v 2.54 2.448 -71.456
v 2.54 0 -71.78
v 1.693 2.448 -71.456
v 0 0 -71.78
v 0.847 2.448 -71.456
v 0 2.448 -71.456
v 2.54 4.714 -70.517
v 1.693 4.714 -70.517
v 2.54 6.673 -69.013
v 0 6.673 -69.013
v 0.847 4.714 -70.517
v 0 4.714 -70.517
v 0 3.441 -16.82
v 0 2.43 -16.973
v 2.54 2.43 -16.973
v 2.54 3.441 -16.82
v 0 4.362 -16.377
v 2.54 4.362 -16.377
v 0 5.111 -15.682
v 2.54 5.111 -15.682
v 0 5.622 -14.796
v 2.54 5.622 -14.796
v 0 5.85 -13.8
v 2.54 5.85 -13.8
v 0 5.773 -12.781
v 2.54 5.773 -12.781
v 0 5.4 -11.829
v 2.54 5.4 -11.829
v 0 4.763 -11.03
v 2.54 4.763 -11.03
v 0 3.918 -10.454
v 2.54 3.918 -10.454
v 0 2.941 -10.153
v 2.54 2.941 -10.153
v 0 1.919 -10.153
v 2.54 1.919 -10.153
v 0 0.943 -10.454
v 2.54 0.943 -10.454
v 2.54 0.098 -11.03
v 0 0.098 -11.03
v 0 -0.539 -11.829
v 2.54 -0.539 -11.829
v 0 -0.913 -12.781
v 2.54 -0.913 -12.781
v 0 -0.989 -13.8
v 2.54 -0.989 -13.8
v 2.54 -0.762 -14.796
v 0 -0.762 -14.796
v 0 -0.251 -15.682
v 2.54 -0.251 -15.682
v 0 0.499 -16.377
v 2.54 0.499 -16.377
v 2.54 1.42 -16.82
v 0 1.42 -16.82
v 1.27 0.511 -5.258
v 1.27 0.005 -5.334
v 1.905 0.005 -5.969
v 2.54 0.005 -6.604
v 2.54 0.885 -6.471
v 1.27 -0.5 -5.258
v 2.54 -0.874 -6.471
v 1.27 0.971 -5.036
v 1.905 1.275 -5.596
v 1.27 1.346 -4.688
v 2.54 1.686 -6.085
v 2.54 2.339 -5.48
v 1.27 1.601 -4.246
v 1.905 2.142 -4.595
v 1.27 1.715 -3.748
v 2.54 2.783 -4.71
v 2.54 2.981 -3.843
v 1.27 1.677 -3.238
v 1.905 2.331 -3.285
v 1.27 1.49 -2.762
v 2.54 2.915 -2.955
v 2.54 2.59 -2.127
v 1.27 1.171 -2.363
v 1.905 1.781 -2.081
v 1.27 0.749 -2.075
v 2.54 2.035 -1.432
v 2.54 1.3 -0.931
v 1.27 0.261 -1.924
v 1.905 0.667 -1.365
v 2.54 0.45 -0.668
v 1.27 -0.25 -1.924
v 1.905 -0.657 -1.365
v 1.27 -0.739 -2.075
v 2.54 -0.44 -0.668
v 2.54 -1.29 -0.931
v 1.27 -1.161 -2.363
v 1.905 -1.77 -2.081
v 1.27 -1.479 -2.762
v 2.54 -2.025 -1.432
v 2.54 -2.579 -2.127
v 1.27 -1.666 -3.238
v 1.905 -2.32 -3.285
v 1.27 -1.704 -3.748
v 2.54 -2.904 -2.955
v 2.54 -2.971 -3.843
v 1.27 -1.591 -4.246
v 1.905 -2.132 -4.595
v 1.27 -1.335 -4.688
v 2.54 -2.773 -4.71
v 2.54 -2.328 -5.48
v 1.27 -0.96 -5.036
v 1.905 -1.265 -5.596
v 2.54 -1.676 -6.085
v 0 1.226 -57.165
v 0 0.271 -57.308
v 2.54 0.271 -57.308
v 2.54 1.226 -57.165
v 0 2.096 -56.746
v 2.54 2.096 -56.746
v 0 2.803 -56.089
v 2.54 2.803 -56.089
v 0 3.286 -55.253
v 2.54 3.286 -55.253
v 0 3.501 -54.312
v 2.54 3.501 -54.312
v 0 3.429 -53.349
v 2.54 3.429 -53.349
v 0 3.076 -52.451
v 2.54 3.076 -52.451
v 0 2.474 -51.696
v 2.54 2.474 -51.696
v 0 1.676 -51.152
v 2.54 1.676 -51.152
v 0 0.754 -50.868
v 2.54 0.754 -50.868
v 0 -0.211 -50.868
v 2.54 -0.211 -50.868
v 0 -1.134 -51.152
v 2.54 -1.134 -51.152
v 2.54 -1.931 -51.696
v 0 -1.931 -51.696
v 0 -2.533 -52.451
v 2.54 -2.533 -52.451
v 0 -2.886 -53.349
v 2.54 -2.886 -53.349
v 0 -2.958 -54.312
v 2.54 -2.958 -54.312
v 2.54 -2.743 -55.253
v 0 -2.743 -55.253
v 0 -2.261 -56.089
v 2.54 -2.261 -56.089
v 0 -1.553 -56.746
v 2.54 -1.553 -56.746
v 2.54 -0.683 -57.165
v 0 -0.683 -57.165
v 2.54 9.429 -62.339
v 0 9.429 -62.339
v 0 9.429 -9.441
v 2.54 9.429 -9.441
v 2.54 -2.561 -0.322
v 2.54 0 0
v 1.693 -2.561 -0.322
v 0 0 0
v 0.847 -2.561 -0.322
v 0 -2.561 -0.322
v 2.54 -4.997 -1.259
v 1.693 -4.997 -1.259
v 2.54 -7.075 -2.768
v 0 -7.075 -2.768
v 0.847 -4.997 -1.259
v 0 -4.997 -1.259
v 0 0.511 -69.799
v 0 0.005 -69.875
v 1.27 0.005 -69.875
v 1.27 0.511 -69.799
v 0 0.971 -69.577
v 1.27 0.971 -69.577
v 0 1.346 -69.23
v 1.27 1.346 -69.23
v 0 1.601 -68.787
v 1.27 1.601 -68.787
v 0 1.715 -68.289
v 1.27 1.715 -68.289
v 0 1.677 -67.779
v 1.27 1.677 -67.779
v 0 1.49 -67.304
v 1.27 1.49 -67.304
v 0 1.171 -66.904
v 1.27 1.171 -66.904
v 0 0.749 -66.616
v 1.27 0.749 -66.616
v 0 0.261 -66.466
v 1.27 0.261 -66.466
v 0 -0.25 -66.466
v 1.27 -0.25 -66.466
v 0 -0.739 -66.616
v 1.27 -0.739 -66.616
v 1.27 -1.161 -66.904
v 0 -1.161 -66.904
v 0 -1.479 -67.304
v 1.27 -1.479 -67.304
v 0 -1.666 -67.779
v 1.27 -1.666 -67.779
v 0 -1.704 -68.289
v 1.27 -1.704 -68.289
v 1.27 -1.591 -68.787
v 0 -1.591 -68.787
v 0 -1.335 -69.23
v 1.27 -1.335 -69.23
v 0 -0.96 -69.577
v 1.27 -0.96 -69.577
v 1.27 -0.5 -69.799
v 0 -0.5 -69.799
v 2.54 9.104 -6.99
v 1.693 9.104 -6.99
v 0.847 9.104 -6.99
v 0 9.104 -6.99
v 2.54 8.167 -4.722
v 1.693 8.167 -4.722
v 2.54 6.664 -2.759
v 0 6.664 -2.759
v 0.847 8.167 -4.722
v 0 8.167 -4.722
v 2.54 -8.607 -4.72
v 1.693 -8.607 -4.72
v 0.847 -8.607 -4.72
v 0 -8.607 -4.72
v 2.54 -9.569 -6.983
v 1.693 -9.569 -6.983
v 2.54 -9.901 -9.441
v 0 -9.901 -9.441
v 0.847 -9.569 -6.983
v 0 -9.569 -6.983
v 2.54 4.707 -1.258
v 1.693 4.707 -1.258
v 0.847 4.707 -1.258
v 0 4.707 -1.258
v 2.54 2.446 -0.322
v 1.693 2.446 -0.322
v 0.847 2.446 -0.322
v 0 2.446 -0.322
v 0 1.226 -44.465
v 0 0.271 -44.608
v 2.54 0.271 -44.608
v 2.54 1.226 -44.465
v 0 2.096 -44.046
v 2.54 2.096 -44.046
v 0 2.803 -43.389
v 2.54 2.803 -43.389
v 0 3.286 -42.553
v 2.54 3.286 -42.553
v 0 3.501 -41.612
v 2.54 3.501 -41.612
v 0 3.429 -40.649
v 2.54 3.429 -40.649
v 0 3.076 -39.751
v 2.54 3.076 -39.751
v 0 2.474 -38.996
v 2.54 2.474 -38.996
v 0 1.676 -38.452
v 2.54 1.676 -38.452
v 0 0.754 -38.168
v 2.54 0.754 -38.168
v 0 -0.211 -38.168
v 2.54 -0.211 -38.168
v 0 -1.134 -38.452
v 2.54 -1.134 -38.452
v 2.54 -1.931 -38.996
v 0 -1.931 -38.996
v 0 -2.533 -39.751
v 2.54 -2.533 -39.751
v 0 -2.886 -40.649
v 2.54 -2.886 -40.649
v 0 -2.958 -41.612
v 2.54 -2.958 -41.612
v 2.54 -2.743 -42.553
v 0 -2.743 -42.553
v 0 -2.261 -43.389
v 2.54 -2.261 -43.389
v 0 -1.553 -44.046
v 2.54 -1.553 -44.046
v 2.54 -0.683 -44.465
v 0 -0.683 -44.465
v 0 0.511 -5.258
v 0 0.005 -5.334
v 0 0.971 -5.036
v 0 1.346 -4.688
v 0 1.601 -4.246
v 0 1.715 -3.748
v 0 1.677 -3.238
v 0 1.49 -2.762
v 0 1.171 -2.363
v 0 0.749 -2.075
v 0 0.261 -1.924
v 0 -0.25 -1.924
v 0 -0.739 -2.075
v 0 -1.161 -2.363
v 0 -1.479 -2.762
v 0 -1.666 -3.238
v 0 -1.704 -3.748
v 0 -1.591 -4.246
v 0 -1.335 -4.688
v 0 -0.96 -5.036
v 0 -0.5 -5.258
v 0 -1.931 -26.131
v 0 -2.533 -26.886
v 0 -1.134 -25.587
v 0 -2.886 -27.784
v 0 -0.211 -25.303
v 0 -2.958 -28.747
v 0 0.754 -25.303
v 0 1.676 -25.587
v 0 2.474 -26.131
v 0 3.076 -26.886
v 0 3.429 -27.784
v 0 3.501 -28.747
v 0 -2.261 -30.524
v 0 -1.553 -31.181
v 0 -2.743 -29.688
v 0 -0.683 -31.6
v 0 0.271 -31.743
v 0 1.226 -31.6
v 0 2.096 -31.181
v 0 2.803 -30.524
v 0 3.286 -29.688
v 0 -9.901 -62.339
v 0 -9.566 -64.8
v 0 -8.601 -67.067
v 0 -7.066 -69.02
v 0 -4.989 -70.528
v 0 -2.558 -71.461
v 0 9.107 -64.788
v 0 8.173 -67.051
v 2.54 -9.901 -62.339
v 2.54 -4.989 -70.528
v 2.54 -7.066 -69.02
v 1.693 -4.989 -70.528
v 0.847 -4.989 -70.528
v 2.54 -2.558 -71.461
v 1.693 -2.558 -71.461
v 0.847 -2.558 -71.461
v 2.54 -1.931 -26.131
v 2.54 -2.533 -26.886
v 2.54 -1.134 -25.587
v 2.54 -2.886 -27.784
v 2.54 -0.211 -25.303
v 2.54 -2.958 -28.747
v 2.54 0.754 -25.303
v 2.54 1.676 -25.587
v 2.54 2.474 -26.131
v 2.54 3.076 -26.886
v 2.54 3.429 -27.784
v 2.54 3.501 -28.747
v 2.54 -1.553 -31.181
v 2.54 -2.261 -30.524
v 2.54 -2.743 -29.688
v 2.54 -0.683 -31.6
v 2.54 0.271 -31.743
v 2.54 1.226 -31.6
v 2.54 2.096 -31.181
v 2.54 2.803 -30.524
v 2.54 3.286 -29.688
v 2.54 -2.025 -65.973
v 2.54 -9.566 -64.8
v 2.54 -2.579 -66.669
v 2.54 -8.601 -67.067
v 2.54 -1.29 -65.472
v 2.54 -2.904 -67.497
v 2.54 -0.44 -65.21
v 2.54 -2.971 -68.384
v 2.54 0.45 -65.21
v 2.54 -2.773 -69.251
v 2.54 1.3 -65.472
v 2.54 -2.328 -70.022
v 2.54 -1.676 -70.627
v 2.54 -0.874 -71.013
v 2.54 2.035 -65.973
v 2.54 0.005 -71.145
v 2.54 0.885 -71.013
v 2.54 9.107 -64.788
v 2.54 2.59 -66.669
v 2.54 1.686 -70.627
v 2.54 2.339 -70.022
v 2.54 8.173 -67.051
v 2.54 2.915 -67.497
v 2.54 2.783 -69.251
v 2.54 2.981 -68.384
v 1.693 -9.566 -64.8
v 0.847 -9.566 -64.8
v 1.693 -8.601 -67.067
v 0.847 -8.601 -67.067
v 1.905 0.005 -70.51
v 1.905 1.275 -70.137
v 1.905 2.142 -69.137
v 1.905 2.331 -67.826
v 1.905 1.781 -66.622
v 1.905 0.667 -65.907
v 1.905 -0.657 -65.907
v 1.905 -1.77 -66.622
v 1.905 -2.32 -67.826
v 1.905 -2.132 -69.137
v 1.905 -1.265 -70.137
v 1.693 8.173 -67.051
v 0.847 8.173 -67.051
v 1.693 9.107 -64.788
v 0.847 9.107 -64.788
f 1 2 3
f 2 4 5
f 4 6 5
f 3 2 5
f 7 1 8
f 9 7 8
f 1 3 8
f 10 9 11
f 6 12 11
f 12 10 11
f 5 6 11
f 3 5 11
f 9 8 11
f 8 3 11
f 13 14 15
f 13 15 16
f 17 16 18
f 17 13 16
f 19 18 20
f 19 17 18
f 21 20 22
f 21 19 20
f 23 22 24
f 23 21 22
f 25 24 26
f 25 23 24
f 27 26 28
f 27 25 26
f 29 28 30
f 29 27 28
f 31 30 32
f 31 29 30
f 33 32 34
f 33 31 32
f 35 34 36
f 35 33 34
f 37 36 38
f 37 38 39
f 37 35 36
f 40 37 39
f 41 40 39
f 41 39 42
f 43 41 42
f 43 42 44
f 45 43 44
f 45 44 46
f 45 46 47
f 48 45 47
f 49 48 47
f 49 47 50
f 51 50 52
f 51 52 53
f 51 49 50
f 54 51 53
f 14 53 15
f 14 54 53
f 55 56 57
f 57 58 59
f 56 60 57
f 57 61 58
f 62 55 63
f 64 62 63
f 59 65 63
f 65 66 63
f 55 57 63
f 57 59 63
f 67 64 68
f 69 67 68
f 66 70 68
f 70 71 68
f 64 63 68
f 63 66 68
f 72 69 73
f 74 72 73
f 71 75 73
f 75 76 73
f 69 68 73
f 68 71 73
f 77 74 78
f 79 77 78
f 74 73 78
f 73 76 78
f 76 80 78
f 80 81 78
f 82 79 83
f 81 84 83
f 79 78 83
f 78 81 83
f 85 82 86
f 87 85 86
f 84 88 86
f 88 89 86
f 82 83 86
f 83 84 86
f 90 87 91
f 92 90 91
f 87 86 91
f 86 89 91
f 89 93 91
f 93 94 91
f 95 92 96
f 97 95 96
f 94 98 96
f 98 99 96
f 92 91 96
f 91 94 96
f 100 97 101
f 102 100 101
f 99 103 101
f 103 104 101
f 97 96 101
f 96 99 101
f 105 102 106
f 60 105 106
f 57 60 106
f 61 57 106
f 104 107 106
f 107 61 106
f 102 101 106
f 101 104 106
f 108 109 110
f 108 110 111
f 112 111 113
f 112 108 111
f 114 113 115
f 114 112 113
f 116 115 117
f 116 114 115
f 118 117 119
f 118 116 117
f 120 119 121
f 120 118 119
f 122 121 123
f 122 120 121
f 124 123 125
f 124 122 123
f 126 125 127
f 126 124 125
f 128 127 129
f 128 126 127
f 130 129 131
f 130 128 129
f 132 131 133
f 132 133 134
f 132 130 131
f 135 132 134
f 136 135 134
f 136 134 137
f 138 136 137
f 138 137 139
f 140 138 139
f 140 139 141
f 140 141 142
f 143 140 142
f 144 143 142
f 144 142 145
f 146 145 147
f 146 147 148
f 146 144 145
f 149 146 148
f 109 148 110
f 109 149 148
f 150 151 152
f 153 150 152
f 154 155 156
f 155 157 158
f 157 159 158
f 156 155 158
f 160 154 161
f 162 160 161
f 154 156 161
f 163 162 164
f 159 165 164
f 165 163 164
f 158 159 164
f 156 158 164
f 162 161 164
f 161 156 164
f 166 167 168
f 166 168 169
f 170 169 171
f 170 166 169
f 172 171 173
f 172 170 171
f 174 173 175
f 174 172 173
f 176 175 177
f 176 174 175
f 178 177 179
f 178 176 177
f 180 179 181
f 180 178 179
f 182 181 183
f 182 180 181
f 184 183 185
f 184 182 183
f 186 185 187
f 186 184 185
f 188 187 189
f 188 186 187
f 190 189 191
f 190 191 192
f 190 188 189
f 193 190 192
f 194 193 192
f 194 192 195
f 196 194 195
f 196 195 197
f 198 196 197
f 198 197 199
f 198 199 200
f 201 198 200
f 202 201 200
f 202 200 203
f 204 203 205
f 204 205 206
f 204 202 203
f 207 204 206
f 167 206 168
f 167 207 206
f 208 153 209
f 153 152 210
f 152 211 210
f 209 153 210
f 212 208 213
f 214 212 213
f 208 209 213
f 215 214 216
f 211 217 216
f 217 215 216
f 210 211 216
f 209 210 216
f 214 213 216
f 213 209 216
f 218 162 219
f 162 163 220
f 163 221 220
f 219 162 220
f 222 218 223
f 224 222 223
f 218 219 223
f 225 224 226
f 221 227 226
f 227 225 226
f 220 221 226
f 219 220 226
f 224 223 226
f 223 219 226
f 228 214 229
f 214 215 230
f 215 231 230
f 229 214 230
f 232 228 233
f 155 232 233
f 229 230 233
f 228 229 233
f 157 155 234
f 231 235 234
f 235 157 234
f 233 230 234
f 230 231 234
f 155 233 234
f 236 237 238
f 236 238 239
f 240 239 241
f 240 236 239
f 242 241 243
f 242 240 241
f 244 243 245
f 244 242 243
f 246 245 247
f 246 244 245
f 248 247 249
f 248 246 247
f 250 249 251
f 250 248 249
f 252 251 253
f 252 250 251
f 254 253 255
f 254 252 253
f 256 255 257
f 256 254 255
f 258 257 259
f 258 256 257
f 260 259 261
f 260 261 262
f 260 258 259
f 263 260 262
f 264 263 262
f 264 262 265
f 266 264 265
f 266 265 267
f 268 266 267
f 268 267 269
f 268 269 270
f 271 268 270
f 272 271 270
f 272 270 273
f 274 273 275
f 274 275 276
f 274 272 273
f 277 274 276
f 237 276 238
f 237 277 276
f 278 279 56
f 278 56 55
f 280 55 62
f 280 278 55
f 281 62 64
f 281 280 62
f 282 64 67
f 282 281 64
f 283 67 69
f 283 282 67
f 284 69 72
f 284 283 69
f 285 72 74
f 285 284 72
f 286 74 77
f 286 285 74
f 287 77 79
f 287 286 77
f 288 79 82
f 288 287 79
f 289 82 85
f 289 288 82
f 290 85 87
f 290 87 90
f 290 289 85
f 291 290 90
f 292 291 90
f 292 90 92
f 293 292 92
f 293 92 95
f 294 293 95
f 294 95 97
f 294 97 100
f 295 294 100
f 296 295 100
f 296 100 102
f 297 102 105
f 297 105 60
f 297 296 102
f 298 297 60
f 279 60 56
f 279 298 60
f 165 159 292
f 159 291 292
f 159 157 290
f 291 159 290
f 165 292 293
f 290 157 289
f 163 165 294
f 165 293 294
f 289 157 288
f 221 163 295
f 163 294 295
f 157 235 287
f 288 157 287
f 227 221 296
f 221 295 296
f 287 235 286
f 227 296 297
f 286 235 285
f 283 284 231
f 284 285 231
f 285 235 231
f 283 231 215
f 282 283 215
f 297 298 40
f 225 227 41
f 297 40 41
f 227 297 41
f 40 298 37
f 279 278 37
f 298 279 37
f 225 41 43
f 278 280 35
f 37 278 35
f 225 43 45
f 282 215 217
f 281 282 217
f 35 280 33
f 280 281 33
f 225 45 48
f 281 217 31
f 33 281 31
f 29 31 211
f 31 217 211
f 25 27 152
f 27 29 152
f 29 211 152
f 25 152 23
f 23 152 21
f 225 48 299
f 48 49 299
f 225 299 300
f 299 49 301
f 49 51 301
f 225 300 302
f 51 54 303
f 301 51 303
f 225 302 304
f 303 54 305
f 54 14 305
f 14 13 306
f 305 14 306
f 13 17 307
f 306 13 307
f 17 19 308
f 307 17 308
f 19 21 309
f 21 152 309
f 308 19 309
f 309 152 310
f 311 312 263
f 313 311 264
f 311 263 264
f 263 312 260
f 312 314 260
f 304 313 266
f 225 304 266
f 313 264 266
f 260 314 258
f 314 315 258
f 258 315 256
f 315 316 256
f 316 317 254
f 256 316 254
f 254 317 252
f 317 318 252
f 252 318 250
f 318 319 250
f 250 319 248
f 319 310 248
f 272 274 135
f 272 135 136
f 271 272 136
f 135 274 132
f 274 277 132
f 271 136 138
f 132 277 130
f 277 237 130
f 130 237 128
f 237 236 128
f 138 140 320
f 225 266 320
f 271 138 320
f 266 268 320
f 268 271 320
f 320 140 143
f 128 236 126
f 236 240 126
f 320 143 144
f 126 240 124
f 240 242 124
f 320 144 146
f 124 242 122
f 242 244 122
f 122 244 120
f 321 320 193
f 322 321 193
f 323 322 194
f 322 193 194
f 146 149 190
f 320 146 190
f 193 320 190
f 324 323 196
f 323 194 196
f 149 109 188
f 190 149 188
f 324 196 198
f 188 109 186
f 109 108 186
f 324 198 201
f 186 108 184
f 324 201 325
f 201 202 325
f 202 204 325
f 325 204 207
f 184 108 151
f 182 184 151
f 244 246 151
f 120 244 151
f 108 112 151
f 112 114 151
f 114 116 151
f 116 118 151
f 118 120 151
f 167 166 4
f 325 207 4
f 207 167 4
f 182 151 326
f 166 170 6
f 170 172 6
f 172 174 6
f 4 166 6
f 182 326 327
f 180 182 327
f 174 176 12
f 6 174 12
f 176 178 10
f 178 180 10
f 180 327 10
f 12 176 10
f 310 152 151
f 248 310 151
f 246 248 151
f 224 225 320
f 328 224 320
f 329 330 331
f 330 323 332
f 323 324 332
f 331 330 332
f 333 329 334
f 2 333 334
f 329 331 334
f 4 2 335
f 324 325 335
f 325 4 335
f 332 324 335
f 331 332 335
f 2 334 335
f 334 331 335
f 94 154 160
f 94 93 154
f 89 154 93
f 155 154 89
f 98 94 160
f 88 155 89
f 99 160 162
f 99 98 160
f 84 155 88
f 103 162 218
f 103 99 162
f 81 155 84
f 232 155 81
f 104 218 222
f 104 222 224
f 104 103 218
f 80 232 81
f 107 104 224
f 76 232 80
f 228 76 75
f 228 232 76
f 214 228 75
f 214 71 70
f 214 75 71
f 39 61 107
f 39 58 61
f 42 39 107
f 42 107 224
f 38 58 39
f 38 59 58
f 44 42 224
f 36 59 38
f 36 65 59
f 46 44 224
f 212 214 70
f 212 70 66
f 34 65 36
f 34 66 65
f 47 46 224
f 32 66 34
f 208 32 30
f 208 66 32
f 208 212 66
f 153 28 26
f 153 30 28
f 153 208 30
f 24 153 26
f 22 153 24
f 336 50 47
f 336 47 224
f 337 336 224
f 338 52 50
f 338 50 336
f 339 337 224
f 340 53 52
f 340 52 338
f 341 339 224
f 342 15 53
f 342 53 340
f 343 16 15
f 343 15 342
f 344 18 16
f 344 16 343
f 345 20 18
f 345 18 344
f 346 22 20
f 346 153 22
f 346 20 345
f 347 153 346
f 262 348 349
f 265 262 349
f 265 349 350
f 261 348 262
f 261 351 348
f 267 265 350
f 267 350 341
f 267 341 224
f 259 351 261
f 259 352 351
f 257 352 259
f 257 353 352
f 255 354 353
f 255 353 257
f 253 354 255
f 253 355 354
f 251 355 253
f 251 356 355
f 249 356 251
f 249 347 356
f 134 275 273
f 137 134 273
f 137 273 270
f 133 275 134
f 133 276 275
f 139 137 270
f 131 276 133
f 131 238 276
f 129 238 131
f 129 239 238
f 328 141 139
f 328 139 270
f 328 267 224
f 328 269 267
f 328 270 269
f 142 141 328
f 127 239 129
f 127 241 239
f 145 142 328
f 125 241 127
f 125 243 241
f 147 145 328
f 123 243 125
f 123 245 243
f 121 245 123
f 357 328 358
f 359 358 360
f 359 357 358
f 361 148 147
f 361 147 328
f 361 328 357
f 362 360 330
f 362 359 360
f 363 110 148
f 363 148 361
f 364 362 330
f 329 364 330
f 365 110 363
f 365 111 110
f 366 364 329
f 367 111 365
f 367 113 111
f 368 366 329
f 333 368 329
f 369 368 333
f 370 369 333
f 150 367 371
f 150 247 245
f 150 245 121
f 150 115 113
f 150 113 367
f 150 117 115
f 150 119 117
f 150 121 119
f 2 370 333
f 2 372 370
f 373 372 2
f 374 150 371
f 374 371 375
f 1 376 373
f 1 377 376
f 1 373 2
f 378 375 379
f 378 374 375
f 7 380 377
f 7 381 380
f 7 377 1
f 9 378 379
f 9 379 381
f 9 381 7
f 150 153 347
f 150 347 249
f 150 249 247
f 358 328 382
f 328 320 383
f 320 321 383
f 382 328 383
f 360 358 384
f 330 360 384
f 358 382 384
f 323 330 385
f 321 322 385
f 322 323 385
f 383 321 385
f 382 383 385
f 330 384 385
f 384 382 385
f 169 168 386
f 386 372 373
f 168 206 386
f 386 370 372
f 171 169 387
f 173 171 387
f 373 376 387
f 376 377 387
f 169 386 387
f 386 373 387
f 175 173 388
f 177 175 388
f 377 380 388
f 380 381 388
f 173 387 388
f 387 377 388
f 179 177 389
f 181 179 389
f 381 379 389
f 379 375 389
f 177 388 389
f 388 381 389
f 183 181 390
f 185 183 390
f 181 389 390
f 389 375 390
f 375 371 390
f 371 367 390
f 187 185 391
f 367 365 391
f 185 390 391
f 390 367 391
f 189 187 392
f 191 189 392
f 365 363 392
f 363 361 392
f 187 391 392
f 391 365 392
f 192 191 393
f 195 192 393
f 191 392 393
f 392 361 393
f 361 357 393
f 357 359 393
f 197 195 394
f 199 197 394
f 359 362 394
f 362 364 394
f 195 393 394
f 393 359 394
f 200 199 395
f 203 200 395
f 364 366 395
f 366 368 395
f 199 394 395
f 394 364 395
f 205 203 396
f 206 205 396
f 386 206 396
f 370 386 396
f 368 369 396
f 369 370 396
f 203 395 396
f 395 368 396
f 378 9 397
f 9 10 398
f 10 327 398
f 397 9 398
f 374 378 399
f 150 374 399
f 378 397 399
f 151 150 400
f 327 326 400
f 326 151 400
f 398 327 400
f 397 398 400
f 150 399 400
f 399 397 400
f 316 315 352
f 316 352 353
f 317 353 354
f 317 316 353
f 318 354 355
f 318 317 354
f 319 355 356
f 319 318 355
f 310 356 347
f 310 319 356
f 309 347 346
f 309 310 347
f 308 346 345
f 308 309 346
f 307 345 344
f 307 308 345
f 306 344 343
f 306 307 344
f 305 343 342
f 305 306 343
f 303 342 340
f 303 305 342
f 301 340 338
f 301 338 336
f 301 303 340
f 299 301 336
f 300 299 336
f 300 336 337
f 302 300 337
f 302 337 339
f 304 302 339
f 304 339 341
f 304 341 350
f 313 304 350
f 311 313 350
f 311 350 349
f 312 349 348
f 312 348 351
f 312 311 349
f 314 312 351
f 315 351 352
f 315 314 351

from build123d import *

# Parameters (mm, degrees)
SKETCH1_R           = 1.714400001
SKETCH1_R_2         = 3.4289
SKETCH1_R_3         = 3.2384
SKETCH1_R_4         = 1.7144
BOSS_EXTRUDE1_DEPTH = 2.54
CHAMFER1_SIZE       = 1.27


with BuildPart() as part:
    # Sketch1 → Boss-Extrude1 (new body)
    with BuildSketch(Plane(origin=(0, 0, 0), x_dir=(0, 0, -1), z_dir=(1, 0, 0))):
        with BuildLine():
            Line((62.3394, 9.4286), (9.441, 9.4286))
            add(Edge.make_bspline(
                [(9.441, 9.4286), (6.94, 9.427), (4.5283, 8.4336), (2.7592, 6.6645)],
                knots=[0.3, 0.3, 0.3, 0.3, 0.4, 0.4, 0.4, 0.4], degree=3))
            add(Edge.make_bspline(
                [(2.7592, 6.6645), (0.9915, 4.897), (-0.0016, 2.4997), (0, 0)],
                knots=[0.4, 0.4, 0.4, 0.4, 0.5, 0.5, 0.5, 0.5], degree=3))
            add(Edge.make_bspline(
                [(0, 0), (0.0015, -2.5473), (0.9866, -5.2522), (2.7684, -7.0749)],
                knots=[0.5, 0.5, 0.5, 0.5, 0.6, 0.6, 0.6, 0.6], degree=3))
            add(Edge.make_bspline(
                [(2.7684, -7.0749), (4.5268, -8.8738), (6.923, -9.9024), (9.441, -9.9008)],
                knots=[0.6, 0.6, 0.6, 0.6, 0.7, 0.7, 0.7, 0.7], degree=3))
            Line((9.441, -9.9008), (62.3394, -9.9008))
            add(Edge.make_bspline(
                [(62.3394, -9.9008), (64.857, -9.8992), (67.2635, -8.868), (69.0205, -7.066)],
                knots=[0.8, 0.8, 0.8, 0.8, 0.9, 0.9, 0.9, 0.9], degree=3))
            add(Edge.make_bspline(
                [(69.0205, -7.066), (70.8008, -5.2404), (71.782, -2.547), (71.7804, -0.0002)],
                knots=[0.9, 0.9, 0.9, 0.9, 1, 1, 1, 1], degree=3))
            add(Edge.make_bspline(
                [(71.7804, -0.0002), (71.7789, 2.4992), (70.7829, 4.9074), (69.0128, 6.6729)],
                knots=[0, 0, 0, 0, 0.1, 0.1, 0.1, 0.1], degree=3))
            add(Edge.make_bspline(
                [(69.0128, 6.6729), (67.2418, 8.4394), (64.8408, 9.4302), (62.3394, 9.4286)],
                knots=[0.1, 0.1, 0.1, 0.1, 0.2, 0.2, 0.2, 0.2], degree=3))
        make_face()
        with Locations((3.6195, 0.005300001)):
            Circle(SKETCH1_R, mode=Mode.SUBTRACT)
        with Locations((13.5437, 2.4303)):
            Circle(SKETCH1_R_2, mode=Mode.SUBTRACT)
        with Locations((28.5051, 0.2713)):
            Circle(SKETCH1_R_3, mode=Mode.SUBTRACT)
        with Locations((41.3701, 0.2713)):
            Circle(SKETCH1_R_3, mode=Mode.SUBTRACT)
        with Locations((54.0701, 0.2713)):
            Circle(SKETCH1_R_3, mode=Mode.SUBTRACT)
        with Locations((68.1608, 0.0053)):
            Circle(SKETCH1_R_4, mode=Mode.SUBTRACT)
    extrude(amount=BOSS_EXTRUDE1_DEPTH)

    # Chamfer1
    chamfer1_edges = [part.edges().sort_by_distance(p)[0] for p in [
        (2.54, 0.005300001, -1.905099999),
        (2.54, 0.0053, -66.4464),
    ]]
    chamfer(chamfer1_edges, length=CHAMFER1_SIZE)


solid = part.part
